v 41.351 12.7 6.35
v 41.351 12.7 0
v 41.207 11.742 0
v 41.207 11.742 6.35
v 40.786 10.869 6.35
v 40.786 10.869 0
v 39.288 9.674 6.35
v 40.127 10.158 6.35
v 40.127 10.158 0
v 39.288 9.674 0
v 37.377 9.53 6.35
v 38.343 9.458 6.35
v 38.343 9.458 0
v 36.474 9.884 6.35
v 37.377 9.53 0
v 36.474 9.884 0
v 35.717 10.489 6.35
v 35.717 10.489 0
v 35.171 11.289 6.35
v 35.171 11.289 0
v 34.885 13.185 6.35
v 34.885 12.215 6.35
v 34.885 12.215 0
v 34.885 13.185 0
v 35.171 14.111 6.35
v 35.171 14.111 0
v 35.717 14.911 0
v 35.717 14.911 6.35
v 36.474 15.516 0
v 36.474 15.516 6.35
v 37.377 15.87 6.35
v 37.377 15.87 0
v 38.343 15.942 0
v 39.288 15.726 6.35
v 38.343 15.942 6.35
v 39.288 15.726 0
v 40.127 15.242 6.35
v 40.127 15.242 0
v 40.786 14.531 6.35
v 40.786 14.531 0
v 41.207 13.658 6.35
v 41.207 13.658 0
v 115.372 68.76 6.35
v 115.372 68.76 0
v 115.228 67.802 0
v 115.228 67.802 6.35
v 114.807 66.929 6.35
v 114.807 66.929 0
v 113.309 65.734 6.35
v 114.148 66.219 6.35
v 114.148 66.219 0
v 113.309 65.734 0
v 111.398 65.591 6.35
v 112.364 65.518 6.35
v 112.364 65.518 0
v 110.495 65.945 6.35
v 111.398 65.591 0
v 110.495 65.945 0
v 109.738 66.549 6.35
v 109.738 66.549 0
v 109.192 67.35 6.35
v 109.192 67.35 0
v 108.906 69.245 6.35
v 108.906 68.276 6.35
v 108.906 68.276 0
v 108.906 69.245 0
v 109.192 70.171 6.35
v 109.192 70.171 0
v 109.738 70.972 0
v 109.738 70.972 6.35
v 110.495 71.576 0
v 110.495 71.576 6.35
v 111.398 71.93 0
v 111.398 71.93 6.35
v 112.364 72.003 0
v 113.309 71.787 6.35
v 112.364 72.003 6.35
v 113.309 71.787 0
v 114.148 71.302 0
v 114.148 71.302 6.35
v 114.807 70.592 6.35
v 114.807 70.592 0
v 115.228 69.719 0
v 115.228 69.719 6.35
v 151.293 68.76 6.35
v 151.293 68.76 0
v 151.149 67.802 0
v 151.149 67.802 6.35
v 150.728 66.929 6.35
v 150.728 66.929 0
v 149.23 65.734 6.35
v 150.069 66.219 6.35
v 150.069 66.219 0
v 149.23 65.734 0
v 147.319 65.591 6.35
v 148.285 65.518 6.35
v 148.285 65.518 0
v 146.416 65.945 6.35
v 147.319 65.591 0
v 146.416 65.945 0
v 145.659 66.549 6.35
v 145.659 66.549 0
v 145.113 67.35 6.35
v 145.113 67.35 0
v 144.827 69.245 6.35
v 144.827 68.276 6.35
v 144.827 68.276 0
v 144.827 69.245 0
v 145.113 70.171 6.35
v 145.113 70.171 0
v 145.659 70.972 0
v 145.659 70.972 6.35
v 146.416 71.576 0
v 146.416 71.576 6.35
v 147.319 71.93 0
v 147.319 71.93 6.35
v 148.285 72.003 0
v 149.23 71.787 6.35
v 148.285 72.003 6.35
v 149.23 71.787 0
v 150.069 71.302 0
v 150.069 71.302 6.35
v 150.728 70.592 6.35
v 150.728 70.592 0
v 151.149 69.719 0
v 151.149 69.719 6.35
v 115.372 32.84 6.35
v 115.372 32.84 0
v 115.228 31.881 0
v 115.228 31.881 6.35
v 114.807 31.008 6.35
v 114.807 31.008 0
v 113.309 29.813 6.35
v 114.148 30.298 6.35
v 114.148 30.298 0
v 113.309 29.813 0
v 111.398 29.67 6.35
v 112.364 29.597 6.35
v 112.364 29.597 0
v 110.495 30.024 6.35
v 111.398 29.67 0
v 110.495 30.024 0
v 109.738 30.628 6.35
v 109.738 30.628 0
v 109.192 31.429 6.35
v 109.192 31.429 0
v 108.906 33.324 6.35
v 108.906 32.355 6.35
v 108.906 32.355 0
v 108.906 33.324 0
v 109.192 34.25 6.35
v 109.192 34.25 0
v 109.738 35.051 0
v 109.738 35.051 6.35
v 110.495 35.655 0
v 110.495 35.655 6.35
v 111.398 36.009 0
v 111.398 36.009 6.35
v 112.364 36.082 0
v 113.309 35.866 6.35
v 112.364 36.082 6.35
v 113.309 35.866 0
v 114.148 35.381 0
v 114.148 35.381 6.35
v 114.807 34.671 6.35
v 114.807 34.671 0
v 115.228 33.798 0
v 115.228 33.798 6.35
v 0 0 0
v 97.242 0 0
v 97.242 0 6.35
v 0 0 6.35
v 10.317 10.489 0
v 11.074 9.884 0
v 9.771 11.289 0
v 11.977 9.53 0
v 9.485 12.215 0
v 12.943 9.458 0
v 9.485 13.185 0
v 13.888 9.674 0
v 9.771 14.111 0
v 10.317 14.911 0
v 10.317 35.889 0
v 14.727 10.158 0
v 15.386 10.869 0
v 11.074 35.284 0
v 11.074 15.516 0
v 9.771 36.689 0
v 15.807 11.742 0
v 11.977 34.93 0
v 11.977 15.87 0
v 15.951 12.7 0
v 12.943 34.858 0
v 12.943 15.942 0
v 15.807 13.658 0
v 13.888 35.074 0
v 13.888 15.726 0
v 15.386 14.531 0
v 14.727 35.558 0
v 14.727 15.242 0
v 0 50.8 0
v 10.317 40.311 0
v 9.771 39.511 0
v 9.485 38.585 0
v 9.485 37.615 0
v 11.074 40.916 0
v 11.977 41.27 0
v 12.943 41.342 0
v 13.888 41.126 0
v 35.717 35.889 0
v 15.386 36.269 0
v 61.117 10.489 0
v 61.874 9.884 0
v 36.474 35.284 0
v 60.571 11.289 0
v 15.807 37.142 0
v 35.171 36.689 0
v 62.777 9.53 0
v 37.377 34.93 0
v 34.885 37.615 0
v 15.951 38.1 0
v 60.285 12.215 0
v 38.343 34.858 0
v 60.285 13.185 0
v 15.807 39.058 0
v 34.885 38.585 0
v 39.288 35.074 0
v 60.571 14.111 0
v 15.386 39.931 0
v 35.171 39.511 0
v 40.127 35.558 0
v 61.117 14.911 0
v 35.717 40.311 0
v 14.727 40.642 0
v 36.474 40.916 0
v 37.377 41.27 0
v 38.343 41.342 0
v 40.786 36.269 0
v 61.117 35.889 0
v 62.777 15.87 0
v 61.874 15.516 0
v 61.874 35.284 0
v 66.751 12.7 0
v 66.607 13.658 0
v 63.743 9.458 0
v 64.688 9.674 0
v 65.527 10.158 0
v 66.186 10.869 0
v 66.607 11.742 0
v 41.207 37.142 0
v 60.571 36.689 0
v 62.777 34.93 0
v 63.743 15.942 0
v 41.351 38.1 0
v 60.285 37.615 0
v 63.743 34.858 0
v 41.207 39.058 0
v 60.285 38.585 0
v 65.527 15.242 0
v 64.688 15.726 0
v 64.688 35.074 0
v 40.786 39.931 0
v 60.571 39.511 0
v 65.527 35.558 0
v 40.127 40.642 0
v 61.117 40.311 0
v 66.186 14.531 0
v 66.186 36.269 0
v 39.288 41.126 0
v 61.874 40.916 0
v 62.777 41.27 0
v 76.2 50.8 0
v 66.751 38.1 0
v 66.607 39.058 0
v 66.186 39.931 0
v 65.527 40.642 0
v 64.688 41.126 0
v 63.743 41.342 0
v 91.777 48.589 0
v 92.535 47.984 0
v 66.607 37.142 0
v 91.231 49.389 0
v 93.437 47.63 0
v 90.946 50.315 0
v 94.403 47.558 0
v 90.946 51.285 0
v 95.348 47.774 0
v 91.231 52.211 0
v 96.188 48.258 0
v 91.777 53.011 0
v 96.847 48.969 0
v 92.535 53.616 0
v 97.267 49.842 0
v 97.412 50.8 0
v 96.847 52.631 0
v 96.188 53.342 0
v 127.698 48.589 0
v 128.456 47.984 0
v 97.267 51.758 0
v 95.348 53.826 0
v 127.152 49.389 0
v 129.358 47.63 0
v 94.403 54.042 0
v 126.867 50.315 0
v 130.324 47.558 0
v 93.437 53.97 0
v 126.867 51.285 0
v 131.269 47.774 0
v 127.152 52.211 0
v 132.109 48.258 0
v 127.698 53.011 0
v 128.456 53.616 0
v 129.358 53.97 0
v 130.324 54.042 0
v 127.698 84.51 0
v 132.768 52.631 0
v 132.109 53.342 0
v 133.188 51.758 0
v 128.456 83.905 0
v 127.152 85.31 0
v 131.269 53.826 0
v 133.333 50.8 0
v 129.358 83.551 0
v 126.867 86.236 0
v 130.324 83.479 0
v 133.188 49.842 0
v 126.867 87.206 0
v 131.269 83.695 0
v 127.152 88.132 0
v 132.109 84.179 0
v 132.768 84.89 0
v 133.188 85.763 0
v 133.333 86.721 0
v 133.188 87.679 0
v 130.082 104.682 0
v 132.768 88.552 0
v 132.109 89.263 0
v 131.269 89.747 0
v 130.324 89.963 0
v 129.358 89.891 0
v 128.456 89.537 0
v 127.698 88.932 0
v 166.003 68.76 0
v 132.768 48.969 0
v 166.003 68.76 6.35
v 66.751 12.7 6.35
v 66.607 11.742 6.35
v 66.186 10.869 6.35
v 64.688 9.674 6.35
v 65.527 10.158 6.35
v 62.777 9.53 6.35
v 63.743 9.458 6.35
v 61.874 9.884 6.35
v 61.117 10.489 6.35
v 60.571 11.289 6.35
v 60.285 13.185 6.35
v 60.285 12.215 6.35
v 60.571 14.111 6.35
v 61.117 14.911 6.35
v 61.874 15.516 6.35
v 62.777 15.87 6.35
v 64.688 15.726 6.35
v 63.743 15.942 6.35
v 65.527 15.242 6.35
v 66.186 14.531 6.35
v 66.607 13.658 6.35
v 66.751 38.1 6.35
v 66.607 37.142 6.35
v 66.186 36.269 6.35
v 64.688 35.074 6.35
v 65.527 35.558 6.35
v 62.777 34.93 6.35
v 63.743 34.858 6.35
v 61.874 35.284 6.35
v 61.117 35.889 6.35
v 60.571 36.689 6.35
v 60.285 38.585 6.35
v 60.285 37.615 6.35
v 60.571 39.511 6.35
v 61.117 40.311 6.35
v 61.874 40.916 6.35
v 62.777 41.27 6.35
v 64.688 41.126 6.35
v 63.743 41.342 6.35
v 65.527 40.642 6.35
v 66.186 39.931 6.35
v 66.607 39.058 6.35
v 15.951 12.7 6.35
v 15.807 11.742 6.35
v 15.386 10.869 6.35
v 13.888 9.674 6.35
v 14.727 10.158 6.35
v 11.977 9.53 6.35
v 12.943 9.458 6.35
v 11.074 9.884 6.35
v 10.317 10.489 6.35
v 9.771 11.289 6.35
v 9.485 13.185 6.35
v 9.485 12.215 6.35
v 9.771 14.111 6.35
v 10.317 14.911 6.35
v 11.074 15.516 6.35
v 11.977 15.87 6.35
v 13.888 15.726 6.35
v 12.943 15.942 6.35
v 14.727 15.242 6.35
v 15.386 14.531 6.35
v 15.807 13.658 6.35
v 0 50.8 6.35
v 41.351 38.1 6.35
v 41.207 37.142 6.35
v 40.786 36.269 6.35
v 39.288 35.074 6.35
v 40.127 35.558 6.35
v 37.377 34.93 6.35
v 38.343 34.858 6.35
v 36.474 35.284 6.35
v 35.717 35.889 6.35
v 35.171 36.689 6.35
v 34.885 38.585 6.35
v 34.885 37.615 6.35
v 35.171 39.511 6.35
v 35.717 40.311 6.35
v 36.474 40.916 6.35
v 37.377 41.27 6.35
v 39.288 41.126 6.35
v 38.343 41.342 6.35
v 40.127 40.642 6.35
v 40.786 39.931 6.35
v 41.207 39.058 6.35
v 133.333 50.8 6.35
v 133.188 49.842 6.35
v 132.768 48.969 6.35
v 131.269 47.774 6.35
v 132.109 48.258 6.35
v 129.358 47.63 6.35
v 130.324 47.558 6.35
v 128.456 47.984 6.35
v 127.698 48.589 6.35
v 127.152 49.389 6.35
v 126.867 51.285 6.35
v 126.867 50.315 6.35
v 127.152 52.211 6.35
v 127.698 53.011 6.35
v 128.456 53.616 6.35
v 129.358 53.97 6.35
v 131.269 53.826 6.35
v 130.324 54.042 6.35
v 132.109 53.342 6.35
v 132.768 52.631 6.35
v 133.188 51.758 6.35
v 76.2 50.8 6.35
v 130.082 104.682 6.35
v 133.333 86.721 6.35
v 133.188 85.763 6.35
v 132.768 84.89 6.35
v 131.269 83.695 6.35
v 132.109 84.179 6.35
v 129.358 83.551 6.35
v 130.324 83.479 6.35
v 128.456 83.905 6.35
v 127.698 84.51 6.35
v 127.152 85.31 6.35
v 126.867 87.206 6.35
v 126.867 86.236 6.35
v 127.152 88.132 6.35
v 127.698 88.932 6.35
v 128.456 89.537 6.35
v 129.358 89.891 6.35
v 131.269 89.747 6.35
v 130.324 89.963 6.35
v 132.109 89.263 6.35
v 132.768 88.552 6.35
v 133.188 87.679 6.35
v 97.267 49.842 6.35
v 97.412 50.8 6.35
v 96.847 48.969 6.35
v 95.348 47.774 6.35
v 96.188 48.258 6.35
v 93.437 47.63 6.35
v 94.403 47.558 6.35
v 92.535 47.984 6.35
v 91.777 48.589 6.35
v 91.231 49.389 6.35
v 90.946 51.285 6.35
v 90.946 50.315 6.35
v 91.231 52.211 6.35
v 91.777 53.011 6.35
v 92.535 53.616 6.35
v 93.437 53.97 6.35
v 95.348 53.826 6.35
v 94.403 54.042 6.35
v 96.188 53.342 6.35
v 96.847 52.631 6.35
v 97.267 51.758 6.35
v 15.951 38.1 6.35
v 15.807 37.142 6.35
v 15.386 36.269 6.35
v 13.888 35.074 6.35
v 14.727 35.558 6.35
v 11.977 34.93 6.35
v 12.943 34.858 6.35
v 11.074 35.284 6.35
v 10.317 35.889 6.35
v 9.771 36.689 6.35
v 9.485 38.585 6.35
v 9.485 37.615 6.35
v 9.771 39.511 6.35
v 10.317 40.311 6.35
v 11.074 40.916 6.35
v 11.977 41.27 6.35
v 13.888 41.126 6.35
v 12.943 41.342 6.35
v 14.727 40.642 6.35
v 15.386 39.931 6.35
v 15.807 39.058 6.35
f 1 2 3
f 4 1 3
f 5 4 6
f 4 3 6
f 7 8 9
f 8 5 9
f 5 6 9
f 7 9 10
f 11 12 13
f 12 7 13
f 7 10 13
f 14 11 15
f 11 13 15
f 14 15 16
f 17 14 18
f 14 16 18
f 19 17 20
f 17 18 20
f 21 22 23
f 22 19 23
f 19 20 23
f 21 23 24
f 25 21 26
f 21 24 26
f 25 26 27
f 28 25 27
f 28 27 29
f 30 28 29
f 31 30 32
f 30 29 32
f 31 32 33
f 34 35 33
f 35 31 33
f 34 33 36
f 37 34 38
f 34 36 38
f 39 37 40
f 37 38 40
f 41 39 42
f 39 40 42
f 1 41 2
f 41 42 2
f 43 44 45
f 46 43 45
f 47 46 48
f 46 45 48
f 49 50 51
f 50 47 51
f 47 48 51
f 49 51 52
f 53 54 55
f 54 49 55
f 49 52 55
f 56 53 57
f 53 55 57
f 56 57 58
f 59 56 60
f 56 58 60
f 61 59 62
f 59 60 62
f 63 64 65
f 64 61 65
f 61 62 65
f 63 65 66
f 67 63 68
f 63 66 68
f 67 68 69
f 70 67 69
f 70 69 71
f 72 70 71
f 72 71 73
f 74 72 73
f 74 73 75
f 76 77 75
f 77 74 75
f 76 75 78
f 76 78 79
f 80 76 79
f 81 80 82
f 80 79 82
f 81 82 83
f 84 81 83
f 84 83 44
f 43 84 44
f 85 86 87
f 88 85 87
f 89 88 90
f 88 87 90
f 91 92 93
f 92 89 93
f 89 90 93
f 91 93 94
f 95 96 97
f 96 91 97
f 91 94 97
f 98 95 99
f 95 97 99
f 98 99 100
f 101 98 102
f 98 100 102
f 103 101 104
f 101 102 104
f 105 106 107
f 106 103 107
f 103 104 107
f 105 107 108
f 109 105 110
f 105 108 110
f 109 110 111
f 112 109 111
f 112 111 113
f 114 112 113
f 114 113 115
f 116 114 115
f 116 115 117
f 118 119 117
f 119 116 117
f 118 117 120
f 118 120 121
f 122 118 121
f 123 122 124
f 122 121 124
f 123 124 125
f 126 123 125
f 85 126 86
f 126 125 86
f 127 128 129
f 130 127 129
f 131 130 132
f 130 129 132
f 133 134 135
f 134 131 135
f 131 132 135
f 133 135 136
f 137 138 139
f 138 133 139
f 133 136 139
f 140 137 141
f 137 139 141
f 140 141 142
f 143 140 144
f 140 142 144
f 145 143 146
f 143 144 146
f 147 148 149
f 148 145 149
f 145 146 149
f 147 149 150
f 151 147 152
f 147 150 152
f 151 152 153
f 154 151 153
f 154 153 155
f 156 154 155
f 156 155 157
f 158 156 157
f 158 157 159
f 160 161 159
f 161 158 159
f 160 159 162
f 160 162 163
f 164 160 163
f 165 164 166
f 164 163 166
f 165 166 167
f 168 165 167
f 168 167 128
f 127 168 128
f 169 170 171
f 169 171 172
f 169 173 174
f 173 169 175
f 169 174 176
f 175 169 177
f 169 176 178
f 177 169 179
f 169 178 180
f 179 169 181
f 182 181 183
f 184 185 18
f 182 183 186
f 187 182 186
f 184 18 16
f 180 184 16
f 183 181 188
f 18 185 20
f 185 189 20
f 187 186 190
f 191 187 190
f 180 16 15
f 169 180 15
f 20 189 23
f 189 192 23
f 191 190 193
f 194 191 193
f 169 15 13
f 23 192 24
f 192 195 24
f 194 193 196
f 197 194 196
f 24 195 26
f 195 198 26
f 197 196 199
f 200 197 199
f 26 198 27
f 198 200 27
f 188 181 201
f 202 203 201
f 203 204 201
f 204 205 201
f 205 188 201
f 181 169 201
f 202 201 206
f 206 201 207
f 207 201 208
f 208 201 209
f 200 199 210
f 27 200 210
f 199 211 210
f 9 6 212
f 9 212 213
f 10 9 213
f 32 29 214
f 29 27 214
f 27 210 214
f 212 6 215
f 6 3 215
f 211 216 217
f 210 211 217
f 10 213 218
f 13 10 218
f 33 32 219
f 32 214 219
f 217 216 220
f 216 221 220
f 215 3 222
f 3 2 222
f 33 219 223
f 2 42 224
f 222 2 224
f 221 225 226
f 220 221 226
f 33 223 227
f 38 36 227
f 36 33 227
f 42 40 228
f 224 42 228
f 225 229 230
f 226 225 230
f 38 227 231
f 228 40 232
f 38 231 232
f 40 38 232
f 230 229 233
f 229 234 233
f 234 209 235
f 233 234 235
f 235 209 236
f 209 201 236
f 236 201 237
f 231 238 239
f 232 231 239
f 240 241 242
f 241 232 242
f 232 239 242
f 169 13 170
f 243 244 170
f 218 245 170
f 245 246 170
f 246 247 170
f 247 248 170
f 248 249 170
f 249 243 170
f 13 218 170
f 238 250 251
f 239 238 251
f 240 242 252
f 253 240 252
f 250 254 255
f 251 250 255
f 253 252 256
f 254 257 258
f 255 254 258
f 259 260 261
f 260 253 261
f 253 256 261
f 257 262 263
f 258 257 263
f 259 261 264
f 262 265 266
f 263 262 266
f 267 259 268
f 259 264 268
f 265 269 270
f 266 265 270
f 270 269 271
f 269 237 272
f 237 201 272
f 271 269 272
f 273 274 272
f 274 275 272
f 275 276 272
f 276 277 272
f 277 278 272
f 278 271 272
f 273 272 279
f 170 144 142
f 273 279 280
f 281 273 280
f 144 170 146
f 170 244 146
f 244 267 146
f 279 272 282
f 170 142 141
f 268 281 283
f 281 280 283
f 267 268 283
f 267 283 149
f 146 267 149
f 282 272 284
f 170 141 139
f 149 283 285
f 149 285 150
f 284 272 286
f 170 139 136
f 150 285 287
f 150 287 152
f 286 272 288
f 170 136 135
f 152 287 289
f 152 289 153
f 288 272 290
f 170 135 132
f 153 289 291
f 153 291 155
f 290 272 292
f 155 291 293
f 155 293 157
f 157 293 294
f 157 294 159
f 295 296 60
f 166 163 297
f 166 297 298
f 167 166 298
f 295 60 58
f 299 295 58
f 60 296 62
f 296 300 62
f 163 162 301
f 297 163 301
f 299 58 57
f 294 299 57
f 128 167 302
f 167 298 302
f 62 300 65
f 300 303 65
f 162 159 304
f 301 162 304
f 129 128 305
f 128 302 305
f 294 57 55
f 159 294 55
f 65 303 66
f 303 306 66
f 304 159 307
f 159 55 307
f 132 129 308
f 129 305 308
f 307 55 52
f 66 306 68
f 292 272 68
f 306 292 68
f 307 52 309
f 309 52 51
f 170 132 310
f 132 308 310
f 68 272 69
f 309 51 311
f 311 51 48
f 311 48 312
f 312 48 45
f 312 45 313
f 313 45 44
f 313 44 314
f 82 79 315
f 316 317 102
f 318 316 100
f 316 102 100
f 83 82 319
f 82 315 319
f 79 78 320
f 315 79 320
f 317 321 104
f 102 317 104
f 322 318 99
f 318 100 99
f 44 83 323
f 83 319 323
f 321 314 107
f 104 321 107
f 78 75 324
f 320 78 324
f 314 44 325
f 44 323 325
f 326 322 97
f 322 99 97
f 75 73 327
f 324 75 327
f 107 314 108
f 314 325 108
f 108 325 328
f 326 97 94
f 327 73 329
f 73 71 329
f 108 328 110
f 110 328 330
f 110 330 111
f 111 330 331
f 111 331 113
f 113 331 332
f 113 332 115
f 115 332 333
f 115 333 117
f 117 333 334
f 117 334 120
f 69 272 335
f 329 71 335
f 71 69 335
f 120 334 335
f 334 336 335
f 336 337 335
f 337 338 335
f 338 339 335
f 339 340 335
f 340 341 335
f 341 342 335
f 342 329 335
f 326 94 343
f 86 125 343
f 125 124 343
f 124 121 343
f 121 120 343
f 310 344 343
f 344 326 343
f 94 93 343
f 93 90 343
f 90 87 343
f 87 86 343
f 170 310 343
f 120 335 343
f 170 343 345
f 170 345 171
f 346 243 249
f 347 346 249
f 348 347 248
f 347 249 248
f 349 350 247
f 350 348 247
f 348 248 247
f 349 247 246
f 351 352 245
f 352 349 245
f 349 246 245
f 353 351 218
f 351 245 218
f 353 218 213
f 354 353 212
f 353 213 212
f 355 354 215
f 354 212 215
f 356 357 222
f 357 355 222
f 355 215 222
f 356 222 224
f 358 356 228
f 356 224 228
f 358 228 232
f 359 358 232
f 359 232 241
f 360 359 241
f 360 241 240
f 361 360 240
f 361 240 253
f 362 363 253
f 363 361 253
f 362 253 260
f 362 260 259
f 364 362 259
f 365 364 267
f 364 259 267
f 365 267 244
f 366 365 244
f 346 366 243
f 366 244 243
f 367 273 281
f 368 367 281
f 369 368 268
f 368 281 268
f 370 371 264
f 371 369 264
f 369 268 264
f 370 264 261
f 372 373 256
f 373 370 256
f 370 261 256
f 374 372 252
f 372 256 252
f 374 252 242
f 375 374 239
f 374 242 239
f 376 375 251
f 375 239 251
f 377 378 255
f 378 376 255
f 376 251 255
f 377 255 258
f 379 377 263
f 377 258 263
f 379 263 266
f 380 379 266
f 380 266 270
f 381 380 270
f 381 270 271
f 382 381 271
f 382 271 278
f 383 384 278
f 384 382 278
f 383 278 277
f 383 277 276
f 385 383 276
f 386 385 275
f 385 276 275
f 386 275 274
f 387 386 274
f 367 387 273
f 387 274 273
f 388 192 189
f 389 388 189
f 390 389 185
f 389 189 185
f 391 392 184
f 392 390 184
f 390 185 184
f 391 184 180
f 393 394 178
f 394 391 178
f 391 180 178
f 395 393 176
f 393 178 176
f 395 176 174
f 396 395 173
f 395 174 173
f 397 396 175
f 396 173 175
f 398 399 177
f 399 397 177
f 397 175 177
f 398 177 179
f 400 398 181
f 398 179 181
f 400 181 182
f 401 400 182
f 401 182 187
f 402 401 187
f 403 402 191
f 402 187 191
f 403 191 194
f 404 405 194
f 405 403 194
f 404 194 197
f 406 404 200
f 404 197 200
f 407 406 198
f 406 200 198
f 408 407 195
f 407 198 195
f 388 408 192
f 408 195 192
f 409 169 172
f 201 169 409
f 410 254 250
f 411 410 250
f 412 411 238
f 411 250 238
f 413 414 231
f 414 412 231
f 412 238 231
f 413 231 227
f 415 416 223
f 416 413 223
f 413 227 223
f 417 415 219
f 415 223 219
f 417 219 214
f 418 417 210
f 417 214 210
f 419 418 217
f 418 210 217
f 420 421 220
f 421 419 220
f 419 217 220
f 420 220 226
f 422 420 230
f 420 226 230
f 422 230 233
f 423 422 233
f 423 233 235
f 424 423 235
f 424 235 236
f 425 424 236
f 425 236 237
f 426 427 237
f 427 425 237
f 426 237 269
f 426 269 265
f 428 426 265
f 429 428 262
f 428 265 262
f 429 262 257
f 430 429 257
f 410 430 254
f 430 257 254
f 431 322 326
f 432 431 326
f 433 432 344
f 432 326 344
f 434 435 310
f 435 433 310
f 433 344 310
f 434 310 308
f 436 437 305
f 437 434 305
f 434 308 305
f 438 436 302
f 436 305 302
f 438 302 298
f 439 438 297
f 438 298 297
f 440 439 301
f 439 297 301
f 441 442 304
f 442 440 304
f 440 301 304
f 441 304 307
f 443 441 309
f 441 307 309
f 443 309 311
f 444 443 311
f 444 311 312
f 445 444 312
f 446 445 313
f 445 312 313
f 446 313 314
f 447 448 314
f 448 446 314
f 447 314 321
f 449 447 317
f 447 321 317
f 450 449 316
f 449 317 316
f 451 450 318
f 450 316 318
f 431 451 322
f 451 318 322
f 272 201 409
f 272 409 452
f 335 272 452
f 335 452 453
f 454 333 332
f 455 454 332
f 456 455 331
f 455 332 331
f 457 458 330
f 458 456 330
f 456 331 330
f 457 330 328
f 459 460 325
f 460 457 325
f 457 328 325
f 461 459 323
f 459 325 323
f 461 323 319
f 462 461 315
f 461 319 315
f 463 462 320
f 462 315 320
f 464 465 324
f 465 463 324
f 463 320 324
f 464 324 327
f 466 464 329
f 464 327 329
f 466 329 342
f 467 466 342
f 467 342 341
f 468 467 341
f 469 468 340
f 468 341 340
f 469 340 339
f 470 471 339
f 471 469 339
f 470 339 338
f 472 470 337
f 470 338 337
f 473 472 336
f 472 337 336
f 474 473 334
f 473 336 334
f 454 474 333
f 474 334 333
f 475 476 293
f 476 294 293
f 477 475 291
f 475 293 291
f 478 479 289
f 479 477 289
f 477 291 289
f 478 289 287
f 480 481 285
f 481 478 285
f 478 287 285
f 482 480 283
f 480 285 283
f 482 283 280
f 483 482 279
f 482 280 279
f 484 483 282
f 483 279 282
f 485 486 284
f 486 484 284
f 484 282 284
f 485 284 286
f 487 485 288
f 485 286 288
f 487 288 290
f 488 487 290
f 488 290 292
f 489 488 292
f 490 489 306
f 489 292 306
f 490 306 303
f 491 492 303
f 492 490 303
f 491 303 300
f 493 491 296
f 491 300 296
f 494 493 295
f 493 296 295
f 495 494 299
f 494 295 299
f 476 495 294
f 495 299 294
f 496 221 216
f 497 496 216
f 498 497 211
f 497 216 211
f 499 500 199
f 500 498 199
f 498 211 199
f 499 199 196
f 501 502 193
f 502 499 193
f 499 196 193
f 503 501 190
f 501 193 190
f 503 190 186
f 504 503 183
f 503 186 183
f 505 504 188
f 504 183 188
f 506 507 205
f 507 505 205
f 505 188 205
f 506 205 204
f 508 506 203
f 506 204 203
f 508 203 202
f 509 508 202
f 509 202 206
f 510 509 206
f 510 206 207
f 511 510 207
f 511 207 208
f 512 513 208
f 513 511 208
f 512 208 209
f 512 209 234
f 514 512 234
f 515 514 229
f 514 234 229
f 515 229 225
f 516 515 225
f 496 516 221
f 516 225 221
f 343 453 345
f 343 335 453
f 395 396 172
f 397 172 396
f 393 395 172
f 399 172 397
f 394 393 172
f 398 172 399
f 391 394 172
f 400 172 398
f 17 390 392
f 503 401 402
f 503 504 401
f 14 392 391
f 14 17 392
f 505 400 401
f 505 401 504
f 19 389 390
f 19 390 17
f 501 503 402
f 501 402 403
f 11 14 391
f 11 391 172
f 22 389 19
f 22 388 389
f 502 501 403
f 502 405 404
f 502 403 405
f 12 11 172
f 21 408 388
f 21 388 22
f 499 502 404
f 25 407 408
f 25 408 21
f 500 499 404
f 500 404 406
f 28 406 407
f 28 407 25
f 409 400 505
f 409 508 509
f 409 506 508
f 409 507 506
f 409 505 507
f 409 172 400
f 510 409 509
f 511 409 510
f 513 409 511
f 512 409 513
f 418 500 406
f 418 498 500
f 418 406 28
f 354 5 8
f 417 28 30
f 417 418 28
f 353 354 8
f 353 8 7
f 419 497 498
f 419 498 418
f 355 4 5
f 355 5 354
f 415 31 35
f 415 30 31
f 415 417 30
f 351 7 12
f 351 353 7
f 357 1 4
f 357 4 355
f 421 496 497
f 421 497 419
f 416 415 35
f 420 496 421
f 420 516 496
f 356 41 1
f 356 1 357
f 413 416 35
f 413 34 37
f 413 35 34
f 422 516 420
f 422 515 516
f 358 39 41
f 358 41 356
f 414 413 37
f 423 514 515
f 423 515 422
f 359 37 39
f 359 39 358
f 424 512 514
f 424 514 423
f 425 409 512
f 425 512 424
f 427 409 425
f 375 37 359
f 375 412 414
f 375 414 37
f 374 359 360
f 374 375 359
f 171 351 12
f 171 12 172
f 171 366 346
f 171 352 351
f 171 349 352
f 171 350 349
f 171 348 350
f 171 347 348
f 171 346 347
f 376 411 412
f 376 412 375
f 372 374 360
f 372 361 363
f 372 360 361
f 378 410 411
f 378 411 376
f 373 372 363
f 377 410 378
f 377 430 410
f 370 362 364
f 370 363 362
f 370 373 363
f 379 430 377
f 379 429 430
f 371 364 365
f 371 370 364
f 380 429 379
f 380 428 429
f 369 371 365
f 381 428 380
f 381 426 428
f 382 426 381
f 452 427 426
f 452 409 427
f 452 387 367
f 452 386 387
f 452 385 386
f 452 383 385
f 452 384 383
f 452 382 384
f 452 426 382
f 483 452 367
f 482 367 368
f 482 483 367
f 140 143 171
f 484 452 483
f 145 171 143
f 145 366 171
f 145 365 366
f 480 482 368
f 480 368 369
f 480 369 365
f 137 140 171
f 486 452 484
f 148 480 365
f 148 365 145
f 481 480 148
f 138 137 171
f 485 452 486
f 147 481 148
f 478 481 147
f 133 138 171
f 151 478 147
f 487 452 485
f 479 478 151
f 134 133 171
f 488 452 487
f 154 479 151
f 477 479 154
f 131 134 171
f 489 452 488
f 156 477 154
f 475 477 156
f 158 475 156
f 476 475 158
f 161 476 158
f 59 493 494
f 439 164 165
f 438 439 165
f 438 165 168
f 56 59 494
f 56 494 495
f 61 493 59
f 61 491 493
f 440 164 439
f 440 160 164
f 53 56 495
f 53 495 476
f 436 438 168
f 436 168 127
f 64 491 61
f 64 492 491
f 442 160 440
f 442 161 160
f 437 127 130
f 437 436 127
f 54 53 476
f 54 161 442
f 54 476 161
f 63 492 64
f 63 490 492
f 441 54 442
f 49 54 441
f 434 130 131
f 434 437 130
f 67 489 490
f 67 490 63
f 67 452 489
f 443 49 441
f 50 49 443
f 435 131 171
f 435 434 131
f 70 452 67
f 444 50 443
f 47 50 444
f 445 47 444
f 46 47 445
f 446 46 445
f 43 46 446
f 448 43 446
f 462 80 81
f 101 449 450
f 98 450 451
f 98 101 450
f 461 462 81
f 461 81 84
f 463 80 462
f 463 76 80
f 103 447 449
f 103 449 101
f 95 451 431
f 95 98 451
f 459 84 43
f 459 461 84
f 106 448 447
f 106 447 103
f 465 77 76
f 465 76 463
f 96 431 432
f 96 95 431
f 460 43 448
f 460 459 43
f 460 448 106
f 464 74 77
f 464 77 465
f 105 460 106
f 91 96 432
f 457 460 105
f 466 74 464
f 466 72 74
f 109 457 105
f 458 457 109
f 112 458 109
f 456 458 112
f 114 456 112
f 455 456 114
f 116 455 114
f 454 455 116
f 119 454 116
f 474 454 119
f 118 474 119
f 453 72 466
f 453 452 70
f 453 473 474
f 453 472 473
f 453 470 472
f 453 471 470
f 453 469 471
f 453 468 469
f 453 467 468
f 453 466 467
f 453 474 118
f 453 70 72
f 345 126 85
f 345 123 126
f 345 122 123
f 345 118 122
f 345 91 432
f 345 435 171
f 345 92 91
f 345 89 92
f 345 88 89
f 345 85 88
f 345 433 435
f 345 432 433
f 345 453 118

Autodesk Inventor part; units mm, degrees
ref_plane "YZ Plane" through (0, 0, 0) normal (1, 0, 0) x (0, 1, 0)
ref_plane "XZ Plane" through (0, 0, 0) normal (0, 1, 0) x (-1, 0, 0)
ref_plane "XY Plane" through (0, 0, 0) normal (0, 0, 1) x (1, 0, 0)
sketch "Sketch1" plane through (0, 0, 0) normal (0, 0, 1) x (1, 0, 0)
  line L0 (0, 0) -> (0, 50.8)
  line L1 (0, 50.8) -> (76.2, 50.8)
  line L2 (76.2, 50.8) -> (130.0815, 104.6815)
  line L3 (130.0815, 104.6815) -> (166.0026, 68.7605)
  line L4 (166.0026, 68.7605) -> (97.242, 0)
  line L5 (97.242, 0) -> (0, 0)
  circle A0 centre (12.7, 12.7) radius 3.2512
  circle A1 centre (12.7, 38.1) radius 3.2512
  circle A2 centre (38.1, 12.7) radius 3.2512
  circle A3 centre (38.1, 38.1) radius 3.2512
  circle A4 centre (63.5, 12.7) radius 3.2512
  circle A5 centre (63.5, 38.1) radius 3.2512
  circle A6 centre (130.0815, 86.721) radius 3.2512
  circle A7 centre (112.121, 68.7605) radius 3.2512
  circle A8 centre (94.1605, 50.8) radius 3.2512
  circle A9 centre (148.042, 68.7605) radius 3.2512
  circle A10 centre (130.0815, 50.8) radius 3.2512
  circle A11 centre (112.121, 32.8395) radius 3.2512
  dimension "d0" = 50.8
  dimension "d1" = 76.2
  dimension "d2" = 76.2
  dimension "d3" = 135
  dimension "d4" = 50.8
  dimension "d5" = 6.5024
  dimension "d6" = 12.7
  dimension "d7" = 12.7
  dimension "d10" = 25.4
  dimension "d13" = 25.4
  dimension "d16" = 6.5024
  dimension "d17" = 12.7
  dimension "d18" = 12.7
  dimension "d21" = 25.4
  dimension "d24" = 25.4
extrude "Extrusion1" add sketch "Sketch1" along normal blind 6.35
properties part number "2x3 Vplate"
